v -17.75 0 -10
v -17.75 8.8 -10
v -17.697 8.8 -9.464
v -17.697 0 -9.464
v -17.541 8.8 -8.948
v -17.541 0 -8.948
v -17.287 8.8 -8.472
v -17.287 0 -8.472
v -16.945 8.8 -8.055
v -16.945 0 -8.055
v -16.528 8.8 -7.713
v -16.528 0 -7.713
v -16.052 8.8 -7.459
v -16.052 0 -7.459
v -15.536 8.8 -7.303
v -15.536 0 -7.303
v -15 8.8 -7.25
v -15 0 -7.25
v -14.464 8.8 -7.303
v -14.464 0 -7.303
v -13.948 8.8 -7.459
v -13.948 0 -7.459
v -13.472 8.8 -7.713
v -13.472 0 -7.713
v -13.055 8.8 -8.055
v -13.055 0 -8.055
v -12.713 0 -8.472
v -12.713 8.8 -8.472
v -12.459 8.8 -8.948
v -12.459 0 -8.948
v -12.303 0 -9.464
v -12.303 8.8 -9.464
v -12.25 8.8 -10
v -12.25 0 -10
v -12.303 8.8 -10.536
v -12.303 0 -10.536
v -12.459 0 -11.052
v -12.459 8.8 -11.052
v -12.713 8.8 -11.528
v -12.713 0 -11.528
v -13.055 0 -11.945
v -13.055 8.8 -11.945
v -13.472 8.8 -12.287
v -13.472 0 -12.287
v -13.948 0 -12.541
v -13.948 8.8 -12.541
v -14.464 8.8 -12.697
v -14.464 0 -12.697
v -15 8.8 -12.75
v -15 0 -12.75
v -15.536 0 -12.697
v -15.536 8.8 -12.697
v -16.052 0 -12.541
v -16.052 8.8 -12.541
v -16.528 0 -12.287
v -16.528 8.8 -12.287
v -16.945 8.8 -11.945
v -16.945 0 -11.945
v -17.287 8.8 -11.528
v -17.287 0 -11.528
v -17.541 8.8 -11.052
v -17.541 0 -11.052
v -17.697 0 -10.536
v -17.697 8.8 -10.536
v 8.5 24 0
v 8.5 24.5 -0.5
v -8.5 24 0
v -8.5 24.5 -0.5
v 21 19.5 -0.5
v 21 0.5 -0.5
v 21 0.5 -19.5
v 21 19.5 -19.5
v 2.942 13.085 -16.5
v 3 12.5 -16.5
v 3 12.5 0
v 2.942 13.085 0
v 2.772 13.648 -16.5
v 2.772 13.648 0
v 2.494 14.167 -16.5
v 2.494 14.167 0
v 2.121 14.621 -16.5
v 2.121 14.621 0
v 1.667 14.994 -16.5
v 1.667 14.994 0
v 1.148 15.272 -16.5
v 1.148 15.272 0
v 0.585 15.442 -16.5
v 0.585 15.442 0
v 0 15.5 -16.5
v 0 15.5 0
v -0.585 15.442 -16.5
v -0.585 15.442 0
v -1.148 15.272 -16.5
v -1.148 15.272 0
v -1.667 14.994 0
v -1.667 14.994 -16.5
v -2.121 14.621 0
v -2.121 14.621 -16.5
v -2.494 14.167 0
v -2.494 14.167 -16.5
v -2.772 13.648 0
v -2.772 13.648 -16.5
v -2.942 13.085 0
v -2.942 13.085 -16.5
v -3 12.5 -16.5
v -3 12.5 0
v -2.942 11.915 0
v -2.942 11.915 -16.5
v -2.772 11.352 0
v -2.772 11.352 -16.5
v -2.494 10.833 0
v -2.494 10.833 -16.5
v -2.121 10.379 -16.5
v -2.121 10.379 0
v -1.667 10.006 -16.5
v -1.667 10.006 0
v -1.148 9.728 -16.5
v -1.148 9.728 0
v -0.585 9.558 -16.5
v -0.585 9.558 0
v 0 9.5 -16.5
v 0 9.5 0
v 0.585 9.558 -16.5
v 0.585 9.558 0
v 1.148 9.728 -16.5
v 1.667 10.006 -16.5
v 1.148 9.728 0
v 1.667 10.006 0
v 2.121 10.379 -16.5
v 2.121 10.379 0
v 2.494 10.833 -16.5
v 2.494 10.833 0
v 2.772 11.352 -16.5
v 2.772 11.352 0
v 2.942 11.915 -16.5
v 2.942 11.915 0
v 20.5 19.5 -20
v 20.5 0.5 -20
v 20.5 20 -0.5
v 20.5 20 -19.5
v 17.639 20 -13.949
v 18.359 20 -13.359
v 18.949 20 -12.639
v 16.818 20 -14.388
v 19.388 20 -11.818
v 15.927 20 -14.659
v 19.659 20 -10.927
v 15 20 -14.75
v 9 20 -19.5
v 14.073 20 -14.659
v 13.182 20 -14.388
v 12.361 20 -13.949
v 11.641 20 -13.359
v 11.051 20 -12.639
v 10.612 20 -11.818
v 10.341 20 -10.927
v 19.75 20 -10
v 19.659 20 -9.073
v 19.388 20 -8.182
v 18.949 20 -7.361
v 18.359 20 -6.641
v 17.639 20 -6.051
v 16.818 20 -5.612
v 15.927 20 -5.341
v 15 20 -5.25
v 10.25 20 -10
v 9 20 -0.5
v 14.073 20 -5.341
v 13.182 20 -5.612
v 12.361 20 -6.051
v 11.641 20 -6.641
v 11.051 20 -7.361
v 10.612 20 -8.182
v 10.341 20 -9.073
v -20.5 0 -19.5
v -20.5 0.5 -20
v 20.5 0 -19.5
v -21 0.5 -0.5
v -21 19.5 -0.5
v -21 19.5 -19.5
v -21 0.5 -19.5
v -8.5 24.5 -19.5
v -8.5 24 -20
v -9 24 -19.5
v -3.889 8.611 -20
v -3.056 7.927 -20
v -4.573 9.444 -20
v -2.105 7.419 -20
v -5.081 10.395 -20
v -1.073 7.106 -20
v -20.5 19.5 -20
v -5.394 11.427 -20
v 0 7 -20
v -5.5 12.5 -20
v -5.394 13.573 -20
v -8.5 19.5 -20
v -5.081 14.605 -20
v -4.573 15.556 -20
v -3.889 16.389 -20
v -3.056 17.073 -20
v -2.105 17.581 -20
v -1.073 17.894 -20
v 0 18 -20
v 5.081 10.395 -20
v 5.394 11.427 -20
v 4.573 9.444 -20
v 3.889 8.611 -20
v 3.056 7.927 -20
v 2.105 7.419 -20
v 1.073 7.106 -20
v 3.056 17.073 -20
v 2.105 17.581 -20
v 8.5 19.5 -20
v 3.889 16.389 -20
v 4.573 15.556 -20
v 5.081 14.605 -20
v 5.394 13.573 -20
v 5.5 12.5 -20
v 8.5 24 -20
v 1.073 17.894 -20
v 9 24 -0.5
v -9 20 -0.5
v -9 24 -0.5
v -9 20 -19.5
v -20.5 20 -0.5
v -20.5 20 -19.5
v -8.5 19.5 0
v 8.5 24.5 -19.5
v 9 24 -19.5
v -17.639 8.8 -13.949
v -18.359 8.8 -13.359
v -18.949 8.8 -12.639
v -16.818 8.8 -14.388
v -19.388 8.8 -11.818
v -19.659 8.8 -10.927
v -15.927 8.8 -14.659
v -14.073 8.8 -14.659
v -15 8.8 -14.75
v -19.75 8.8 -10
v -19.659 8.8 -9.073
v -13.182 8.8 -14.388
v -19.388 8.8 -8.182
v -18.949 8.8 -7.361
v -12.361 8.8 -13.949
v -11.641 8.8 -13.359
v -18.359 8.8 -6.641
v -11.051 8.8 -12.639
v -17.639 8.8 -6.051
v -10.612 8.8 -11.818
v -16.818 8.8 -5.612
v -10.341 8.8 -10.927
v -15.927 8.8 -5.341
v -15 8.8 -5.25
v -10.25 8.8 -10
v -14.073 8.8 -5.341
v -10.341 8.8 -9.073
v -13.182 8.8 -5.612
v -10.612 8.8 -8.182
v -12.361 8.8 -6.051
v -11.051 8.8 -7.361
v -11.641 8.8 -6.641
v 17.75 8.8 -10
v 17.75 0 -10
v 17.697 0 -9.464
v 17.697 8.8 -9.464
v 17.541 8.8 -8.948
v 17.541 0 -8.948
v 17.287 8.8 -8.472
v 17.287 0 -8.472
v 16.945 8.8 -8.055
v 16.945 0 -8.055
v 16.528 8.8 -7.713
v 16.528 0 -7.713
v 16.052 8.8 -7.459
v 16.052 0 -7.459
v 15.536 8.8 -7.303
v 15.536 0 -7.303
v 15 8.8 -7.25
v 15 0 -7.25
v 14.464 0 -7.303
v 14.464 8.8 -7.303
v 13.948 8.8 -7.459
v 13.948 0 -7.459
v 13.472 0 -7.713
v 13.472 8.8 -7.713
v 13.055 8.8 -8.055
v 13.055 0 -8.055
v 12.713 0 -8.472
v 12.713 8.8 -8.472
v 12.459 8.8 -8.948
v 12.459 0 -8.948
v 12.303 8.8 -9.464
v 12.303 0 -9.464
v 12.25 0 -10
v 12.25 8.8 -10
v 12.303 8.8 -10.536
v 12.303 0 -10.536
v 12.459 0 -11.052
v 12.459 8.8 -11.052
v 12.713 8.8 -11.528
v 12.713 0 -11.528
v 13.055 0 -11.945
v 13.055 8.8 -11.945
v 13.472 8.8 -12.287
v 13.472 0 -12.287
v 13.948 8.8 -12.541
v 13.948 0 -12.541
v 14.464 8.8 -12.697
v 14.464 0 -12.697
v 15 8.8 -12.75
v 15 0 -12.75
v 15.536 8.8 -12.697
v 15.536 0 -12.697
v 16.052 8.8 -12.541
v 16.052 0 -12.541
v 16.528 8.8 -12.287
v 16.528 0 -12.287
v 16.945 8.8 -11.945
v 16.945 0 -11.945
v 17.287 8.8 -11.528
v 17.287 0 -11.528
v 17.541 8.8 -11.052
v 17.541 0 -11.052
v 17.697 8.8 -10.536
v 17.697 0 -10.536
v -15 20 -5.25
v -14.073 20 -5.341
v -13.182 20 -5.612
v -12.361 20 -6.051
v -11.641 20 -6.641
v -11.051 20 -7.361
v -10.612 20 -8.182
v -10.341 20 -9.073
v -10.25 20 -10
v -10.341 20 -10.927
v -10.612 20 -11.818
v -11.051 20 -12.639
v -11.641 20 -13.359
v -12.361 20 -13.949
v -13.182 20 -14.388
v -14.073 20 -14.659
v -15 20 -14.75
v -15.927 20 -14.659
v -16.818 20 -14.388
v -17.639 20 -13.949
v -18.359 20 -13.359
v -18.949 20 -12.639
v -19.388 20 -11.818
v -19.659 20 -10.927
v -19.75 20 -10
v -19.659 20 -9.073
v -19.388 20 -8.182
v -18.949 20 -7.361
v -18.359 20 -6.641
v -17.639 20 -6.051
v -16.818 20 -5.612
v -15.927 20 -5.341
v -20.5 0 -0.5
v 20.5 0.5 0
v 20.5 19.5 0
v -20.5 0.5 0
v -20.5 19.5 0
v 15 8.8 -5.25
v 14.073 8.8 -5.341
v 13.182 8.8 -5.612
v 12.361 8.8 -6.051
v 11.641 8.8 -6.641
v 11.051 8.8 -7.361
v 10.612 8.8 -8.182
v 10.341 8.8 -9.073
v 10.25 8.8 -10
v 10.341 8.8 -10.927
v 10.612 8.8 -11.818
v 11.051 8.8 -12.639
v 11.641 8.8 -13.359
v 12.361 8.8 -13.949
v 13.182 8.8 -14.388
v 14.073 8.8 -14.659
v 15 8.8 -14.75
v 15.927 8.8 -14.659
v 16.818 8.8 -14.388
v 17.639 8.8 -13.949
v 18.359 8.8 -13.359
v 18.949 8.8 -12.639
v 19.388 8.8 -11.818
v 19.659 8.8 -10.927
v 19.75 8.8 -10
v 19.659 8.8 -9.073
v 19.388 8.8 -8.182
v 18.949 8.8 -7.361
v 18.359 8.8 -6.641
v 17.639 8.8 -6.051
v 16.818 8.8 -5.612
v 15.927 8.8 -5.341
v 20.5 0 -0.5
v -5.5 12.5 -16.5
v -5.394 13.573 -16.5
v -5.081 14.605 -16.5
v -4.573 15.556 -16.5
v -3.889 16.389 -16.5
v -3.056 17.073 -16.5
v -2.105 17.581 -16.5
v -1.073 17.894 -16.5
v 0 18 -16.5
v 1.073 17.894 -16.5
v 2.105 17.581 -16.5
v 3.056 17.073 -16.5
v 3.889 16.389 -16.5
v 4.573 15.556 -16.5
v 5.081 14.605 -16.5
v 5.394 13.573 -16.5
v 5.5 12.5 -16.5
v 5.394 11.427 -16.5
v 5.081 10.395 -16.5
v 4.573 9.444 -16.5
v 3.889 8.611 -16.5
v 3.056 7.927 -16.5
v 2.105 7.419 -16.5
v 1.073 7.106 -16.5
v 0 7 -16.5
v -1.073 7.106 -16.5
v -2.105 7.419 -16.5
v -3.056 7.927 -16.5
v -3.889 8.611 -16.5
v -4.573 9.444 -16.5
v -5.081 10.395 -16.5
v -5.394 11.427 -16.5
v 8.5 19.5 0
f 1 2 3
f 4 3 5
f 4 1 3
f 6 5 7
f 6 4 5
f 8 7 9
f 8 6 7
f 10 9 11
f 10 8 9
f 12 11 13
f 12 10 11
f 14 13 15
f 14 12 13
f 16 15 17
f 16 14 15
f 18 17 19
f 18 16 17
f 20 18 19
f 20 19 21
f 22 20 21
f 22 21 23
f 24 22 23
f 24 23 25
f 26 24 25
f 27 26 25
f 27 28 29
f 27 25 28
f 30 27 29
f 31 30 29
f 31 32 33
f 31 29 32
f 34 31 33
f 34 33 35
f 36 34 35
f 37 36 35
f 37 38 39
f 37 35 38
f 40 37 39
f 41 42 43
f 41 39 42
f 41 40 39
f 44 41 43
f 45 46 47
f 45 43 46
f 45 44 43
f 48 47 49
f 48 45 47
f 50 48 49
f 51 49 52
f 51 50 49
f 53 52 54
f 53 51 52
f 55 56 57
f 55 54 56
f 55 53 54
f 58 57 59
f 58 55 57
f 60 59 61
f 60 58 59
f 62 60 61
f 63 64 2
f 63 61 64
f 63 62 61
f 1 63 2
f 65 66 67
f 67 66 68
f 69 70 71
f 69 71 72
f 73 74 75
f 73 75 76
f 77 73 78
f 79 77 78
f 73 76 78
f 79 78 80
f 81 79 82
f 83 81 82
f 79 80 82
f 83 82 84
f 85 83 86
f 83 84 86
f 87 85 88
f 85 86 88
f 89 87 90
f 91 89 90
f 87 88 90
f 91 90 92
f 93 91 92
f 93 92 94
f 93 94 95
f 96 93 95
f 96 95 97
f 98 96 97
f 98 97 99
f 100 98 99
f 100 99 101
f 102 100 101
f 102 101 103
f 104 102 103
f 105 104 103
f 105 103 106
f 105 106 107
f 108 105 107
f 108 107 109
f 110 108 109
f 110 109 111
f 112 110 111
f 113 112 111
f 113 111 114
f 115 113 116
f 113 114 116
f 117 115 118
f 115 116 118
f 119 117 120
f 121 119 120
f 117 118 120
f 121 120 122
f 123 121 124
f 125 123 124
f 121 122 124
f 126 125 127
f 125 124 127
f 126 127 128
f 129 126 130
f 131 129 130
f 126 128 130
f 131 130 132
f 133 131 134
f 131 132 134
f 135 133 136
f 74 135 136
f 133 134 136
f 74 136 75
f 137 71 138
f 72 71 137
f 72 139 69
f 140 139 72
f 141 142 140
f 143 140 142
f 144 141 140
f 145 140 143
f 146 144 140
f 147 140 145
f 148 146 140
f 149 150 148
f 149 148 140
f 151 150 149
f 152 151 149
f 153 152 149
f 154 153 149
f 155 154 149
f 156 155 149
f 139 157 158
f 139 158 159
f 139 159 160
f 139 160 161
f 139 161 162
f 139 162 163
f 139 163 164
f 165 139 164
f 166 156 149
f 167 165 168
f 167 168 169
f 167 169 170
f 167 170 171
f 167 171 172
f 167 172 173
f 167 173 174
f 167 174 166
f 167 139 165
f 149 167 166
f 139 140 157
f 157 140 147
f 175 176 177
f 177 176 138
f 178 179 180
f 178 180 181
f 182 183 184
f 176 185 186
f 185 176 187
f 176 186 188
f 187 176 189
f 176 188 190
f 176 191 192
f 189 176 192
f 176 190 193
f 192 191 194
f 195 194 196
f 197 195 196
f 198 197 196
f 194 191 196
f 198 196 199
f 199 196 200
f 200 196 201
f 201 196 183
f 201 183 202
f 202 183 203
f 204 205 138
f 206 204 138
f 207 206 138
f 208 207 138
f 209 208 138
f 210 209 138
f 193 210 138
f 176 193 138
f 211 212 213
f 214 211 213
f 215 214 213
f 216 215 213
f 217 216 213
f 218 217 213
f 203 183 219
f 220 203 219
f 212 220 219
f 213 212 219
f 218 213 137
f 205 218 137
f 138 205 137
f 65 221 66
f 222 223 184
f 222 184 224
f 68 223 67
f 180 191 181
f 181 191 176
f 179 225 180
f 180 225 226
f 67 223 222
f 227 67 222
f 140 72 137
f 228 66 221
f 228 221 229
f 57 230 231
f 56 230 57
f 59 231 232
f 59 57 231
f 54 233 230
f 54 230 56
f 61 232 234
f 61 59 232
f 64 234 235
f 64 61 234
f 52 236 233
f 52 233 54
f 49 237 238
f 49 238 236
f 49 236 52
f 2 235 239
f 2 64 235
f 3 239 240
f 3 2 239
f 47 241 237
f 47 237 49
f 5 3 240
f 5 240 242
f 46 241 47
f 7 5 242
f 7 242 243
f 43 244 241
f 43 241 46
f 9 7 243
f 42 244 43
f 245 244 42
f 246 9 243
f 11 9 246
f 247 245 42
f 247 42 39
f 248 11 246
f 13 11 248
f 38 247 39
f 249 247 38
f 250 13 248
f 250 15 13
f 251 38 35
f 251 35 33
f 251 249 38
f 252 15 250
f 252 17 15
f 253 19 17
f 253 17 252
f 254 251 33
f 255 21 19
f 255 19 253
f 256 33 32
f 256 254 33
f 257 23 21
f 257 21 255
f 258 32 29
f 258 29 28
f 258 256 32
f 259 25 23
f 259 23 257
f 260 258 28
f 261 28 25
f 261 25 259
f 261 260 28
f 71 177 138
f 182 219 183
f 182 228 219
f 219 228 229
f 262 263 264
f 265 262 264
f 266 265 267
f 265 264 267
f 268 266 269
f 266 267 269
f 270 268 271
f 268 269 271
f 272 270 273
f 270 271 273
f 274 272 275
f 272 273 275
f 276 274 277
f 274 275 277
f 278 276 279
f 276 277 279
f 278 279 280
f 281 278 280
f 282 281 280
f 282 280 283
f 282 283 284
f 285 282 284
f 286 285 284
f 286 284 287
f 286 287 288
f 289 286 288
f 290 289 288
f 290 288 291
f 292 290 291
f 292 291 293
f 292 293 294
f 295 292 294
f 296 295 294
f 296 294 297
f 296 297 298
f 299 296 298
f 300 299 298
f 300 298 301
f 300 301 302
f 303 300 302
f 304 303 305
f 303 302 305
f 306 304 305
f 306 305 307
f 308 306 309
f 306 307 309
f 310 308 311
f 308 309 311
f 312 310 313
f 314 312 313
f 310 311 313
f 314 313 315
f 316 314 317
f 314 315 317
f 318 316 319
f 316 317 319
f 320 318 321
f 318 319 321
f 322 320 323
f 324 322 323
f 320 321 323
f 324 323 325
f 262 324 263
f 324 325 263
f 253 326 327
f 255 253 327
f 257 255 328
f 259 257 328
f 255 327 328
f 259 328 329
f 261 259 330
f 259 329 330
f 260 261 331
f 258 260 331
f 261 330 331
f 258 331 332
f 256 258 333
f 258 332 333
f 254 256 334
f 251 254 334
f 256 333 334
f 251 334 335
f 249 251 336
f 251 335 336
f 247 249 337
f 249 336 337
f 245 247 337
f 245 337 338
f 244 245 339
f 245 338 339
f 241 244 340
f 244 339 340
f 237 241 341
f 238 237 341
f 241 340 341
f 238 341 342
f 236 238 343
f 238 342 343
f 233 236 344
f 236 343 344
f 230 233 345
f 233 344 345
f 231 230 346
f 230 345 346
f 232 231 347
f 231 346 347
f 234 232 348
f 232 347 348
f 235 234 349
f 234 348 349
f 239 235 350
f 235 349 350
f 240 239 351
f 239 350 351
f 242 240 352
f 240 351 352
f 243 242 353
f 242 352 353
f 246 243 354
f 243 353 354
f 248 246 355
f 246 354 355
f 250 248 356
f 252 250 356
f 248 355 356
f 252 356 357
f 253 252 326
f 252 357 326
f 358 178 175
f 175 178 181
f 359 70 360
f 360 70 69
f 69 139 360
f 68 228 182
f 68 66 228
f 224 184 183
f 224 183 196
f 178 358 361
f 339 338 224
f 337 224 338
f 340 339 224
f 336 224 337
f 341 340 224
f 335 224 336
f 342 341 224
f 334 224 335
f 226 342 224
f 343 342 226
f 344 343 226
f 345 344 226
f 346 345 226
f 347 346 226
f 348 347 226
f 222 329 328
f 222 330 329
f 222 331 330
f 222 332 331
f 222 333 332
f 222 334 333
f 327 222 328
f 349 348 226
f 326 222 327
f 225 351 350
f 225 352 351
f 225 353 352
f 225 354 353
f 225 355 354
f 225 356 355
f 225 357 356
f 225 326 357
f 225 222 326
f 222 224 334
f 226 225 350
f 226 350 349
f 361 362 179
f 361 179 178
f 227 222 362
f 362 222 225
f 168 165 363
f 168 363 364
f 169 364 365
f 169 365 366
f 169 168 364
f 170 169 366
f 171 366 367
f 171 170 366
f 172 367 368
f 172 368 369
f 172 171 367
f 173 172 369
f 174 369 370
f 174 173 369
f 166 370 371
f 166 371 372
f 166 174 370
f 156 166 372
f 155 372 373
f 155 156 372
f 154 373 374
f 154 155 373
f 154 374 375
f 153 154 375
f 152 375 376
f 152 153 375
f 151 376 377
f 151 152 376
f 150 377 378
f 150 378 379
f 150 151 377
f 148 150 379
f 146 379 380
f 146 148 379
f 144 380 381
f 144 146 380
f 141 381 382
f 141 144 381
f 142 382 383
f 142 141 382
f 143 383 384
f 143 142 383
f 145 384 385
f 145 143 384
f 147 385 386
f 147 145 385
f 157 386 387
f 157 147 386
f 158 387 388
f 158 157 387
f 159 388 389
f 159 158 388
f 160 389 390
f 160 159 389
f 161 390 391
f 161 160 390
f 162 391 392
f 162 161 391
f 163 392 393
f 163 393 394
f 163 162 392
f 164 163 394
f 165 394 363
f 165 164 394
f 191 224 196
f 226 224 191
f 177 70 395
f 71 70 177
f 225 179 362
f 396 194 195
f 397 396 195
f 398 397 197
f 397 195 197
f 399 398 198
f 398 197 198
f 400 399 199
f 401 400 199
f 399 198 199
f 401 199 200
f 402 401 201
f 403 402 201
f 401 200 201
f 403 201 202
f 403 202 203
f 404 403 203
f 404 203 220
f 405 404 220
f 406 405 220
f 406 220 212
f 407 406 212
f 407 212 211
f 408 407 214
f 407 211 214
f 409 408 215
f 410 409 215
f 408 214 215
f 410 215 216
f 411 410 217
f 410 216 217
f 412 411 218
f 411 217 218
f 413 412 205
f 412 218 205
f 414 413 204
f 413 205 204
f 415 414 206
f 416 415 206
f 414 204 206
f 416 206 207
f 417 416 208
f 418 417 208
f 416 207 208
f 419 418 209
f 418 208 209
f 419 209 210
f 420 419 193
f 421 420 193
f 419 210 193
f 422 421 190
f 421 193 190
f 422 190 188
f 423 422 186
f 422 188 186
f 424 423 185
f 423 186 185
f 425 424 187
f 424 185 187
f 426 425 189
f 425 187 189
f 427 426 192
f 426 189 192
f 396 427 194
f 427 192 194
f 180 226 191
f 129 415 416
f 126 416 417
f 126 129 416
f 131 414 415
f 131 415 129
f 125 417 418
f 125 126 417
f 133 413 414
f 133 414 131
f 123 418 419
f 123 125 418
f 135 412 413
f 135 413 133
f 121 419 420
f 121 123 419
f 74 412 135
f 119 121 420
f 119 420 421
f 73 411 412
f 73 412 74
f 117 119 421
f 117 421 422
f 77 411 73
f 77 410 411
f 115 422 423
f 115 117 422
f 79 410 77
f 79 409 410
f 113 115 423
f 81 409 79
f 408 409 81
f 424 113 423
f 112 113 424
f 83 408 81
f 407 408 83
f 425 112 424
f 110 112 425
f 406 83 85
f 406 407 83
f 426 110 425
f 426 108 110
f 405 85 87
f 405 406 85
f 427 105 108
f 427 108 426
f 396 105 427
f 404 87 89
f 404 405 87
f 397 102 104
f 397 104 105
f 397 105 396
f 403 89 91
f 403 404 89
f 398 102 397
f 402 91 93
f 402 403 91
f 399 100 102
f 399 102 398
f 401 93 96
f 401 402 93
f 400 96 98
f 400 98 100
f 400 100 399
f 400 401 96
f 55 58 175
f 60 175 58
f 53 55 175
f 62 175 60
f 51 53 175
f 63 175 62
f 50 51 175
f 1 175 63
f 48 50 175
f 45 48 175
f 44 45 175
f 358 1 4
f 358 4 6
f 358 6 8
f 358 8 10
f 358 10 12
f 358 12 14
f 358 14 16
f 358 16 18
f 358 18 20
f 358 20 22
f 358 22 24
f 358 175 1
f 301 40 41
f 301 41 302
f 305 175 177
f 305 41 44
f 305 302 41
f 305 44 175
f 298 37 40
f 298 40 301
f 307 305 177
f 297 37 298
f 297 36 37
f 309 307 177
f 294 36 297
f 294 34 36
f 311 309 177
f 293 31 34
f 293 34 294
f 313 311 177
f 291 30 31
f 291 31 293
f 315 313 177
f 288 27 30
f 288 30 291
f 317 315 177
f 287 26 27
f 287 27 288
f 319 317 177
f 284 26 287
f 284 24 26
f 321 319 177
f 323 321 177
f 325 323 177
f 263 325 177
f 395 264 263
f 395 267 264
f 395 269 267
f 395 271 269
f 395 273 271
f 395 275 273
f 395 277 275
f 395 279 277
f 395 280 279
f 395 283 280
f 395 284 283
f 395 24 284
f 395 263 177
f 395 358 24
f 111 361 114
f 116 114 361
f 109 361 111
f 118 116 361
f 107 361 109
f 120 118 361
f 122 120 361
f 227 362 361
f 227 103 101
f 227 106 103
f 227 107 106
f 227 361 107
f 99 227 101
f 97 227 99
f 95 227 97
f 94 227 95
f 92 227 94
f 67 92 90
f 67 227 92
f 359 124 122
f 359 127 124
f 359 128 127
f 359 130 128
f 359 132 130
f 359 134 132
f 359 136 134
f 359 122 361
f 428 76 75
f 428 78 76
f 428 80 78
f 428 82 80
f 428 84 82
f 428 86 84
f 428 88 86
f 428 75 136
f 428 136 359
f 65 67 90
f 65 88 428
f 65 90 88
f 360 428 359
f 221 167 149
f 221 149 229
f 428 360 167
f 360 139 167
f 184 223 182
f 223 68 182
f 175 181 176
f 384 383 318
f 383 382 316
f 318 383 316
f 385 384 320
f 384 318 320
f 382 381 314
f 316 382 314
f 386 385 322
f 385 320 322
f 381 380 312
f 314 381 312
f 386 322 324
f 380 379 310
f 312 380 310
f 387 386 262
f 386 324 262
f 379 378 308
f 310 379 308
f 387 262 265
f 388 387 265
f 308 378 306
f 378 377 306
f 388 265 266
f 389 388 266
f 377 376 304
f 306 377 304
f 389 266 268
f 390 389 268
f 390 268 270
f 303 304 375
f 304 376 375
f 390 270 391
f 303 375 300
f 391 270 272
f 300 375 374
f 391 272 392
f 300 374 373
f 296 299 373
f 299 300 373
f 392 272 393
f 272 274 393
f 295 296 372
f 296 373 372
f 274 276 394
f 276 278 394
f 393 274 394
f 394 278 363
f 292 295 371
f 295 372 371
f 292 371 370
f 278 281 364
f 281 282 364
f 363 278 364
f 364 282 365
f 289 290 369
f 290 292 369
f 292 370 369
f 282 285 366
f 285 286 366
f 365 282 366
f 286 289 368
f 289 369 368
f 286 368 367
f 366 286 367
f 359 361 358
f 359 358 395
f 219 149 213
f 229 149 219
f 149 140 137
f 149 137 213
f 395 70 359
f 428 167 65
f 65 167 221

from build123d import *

# Parameters (mm, degrees)
BOSS_EXTRUDE1_DEPTH = 20
CUT_EXTRUDE2_REACH  = 39.964
SKETCH4_R           = 2.75
SKETCH2_R           = 4.75
CUT_EXTRUDE3_DEPTH  = 11.2
CUT_EXTRUDE4_REACH  = 39.964
SKETCH5_R           = 3
SKETCH6_R           = 5.5
CUT_EXTRUDE5_DEPTH  = 3.5
CHAMFER1_SIZE       = 0.5


with BuildPart() as part:
    # Sketch1 → Boss-Extrude1 (new body)
    with BuildSketch(Plane.XY):
        Polygon((-21, 0), (21, 0), (21, 20), (9, 20), (9, 24.5), (-9, 24.5), (-9, 20), (-21, 20), align=None)
    extrude(amount=-BOSS_EXTRUDE1_DEPTH)

    # Sketch4 → Cut-Extrude2 (cut, up to next)
    with BuildSketch(Plane(origin=(0, 0, 0), x_dir=(1, 0, 0), z_dir=(0, 1, 0)), mode=Mode.PRIVATE) as cut_extrude2_sk1:
        with Locations(Location((-15, 10, 0), (0, 0, 180))):
            Circle(SKETCH4_R)
    cut_extrude2_tool1 = extrude(cut_extrude2_sk1.sketch, amount=CUT_EXTRUDE2_REACH, mode=Mode.PRIVATE) & part.part
    cut_extrude2 = cut_extrude2_tool1.solids().sort_by_distance((-15, 0, -10))[0]
    add(cut_extrude2, mode=Mode.SUBTRACT)

    # Sketch2 → Cut-Extrude3 (cut)
    with BuildSketch(Plane(origin=(0, 20, 0), x_dir=(1, 0, 0), z_dir=(0, 1, 0))):
        with Locations(Location((-15, 10, 0), (0, 0, 270))):
            Circle(SKETCH2_R)
    cut_extrude3 = extrude(amount=-CUT_EXTRUDE3_DEPTH, mode=Mode.SUBTRACT)

    # Mirror1: Cut-Extrude2, Cut-Extrude3 across plane
    add(cut_extrude2.mirror(Plane(origin=(0, 0, 0), x_dir=(0, 0, 1), z_dir=(1, 0, 0))), mode=Mode.SUBTRACT)
    add(cut_extrude3.mirror(Plane(origin=(0, 0, 0), x_dir=(0, 0, 1), z_dir=(1, 0, 0))), mode=Mode.SUBTRACT)

    # Sketch5 → Cut-Extrude4 (cut, up to next)
    with BuildSketch(Plane.XY, mode=Mode.PRIVATE) as cut_extrude4_sk1:
        with Locations((0, 12.5)):
            Circle(SKETCH5_R)
    cut_extrude4_tool1 = extrude(cut_extrude4_sk1.sketch, amount=-CUT_EXTRUDE4_REACH, mode=Mode.PRIVATE) & part.part
    add(cut_extrude4_tool1.solids().sort_by_distance((0, 12.5, 0))[0], mode=Mode.SUBTRACT)

    # Sketch6 → Cut-Extrude5 (cut)
    with BuildSketch(Plane(origin=(0, 0, -20), x_dir=(-1, 0, 0), z_dir=(0, 0, -1))):
        with Locations((0, 12.5)):
            Circle(SKETCH6_R)
    extrude(amount=-CUT_EXTRUDE5_DEPTH, mode=Mode.SUBTRACT)

    # Chamfer1
    chamfer1_edges = [part.edges().sort_by_distance(p)[0] for p in [
        (0, 24.5, -20),
        (9, 22.25, 0),
        (15, 20, 0),
        (-9, 22.25, -20),
        (21, 20, -10),
        (21, 0, -10),
        (-21, 0, -10),
        (-21, 20, -10),
        (-9, 24.5, -10),
        (9, 24.5, -10),
        (-15, 20, -20),
        (-21, 10, -20),
        (0, 0, -20),
        (21, 10, -20),
        (15, 20, -20),
        (9, 22.25, -20),
        (21, 10, 0),
        (0, 0, 0),
        (-21, 10, 0),
        (-15, 20, 0),
        (-9, 22.25, 0),
        (0, 24.5, 0),
    ]]
    chamfer(chamfer1_edges, length=CHAMFER1_SIZE)


solid = part.part
